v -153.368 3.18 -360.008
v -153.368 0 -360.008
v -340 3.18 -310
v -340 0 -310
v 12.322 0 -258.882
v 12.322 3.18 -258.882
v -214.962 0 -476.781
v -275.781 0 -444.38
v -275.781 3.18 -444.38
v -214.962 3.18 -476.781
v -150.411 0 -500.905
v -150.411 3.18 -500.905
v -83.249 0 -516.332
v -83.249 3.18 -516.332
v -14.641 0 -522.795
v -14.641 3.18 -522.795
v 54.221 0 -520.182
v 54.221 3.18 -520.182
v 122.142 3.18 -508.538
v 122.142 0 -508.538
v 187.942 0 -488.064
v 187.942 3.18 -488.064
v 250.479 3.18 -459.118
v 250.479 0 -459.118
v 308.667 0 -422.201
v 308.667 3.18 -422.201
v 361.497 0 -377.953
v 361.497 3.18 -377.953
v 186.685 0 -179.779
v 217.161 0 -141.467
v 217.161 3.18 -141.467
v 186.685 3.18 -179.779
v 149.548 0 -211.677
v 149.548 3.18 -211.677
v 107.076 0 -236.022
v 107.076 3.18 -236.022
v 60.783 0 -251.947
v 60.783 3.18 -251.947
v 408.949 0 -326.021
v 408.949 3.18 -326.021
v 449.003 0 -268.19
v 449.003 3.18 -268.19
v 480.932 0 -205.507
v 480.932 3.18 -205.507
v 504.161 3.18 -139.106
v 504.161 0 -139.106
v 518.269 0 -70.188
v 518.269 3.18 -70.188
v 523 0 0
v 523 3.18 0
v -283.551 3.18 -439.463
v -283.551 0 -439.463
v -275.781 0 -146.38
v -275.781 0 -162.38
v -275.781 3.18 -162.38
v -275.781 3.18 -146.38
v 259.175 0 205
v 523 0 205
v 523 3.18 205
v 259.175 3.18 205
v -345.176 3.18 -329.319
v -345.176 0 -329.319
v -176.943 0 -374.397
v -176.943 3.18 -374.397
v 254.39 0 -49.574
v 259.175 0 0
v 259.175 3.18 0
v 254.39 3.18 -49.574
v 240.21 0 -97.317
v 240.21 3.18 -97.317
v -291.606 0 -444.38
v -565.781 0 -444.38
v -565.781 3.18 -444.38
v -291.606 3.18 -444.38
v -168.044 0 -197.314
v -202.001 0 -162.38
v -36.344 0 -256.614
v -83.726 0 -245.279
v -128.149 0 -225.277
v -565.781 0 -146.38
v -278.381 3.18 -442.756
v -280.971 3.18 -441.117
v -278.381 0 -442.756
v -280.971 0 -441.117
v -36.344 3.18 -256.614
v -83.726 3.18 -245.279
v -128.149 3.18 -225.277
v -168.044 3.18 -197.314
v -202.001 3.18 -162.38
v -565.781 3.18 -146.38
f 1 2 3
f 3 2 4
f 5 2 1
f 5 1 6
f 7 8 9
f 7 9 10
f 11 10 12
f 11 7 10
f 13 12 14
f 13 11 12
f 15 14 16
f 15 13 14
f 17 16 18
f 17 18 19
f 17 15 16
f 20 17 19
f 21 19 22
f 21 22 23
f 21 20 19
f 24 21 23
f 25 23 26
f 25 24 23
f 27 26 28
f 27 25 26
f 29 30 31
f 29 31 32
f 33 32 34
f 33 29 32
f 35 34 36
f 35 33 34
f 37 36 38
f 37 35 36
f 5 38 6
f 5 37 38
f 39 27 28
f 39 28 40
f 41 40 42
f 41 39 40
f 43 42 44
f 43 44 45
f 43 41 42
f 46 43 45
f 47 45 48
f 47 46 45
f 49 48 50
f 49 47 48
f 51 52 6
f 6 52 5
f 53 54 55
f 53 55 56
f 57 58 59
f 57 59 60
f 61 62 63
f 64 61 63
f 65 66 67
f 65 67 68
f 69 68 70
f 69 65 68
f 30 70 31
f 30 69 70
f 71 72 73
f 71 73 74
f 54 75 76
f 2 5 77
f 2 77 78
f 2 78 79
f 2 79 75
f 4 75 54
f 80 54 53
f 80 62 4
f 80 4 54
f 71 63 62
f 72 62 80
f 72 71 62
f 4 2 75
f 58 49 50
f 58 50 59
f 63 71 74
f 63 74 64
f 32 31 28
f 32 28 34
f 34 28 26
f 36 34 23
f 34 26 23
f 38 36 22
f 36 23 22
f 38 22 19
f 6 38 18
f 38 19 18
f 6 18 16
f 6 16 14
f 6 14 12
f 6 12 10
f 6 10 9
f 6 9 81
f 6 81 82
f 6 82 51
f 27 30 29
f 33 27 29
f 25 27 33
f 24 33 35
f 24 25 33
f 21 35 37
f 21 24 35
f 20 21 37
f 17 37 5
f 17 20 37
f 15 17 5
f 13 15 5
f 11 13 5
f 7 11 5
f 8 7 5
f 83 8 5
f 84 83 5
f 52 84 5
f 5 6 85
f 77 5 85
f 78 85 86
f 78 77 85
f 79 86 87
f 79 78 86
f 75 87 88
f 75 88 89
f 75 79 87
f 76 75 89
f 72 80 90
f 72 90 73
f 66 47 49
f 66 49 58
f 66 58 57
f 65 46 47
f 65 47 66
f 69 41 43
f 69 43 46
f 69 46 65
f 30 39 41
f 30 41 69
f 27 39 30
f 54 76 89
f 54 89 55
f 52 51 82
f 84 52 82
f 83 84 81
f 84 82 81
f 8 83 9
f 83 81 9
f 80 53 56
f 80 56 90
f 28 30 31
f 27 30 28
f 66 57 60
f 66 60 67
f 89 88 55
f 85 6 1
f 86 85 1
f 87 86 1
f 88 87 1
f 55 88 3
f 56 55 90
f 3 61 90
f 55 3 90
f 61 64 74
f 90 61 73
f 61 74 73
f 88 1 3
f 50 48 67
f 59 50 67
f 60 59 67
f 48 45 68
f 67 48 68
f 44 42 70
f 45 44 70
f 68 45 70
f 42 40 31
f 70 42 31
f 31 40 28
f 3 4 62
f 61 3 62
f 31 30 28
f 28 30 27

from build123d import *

# Parameters (mm, degrees)
BOSS_EXTRUDE1_DEPTH = 3.18
CUT_EXTRUDE1_DEPTH  = 771.485416357
CUT_EXTRUDE2_DEPTH  = 771.485416357


# Read off the part's stored shape, not the designer's step: Split3
with BuildPart() as part:
    # Sketch1 → Boss-Extrude1 (new body)
    with BuildSketch(Plane(origin=(0, 0, 0), x_dir=(1, 0, 0), z_dir=(0, 1, 0))):
        with BuildLine():
            Line((-565.781463482, 444.38), (-275.781463482, 444.38))
            ThreePointArc((-275.781463482, 444.38), (254.259016162, 457.035395457), (523, 0))
            Line((523, 0), (523, -205))
            Line((523, -205), (259.175, -205))
            Line((259.175, -205), (259.175, 0))
            ThreePointArc((259.175, 0), (86.075732957, 244.464003119), (-202.001030257, 162.38))
            Line((-202.001030257, 162.38), (-275.781463482, 162.38))
            Line((-275.781463482, 162.38), (-275.781463482, 146.38))
            Line((-275.781463482, 146.38), (-565.781463482, 146.38))
            Line((-565.781463482, 146.38), (-565.781463482, 162.38))
            Line((-565.781463482, 162.38), (-565.781463482, 444.38))
        make_face()
    extrude(amount=BOSS_EXTRUDE1_DEPTH)


with BuildPart() as body_2:
    # Split2: the piece on the far side of the plane
    add(part.part)
    split(bisect_by=Plane(origin=(95.313758644, 0, 58.173323286), x_dir=(0.5209675909432273, 0, -0.8535764577276076), z_dir=(-0.8535764577276076, 0, -0.5209675909432273)), keep=Keep.BOTTOM)


with BuildPart() as part_1:
    add(part.part)

    # Split2
    split(bisect_by=Plane(origin=(95.313758644, 0, 58.173323286), x_dir=(0.5209675909432273, 0, -0.8535764577276076), z_dir=(-0.8535764577276076, 0, -0.5209675909432273)), keep=Keep.TOP)


with BuildPart() as body_3:
    # Split3: the piece on the far side of the plane
    add(part_1.part)
    split(bisect_by=Plane(origin=(118.465339809, 0, -194.098878463), x_dir=(0.8535764577276066, 0, 0.5209675909432288), z_dir=(0.5209675909432288, 0, -0.8535764577276067)), keep=Keep.BOTTOM)

    # Sketch5 → Cut-Extrude2 (cut, through all)
    with BuildSketch(Plane.XZ):
        Polygon((-340, -310), (-345.176380902, -329.318516526), (-94.035666067, -396.611468252), (-88.859285165, -377.292951727), align=None)
    extrude(amount=-CUT_EXTRUDE2_DEPTH, mode=Mode.SUBTRACT)


with BuildPart() as part_2:
    add(part_1.part)

    # Split3
    split(bisect_by=Plane(origin=(118.465339809, 0, -194.098878463), x_dir=(0.8535764577276066, 0, 0.5209675909432288), z_dir=(0.5209675909432288, 0, -0.8535764577276067)), keep=Keep.TOP)

    # Sketch4 → Cut-Extrude1 (cut, through all)
    with BuildSketch(Plane(origin=(0, 3.18, 0), x_dir=(1, 0, 0), z_dir=(0, 1, 0))):
        with BuildLine():
            Line((-291.606374577, 444.38), (-283.55067597, 439.463325156))
            ThreePointArc((-283.55067597, 439.463325156), (-279.676874229, 441.938735597), (-275.781463482, 444.38))
            Line((-275.781463482, 444.38), (-291.606374577, 444.38))
        make_face()
    extrude(amount=-CUT_EXTRUDE1_DEPTH, mode=Mode.SUBTRACT)


solid = Compound([body_2.part, body_3.part, part_2.part])
